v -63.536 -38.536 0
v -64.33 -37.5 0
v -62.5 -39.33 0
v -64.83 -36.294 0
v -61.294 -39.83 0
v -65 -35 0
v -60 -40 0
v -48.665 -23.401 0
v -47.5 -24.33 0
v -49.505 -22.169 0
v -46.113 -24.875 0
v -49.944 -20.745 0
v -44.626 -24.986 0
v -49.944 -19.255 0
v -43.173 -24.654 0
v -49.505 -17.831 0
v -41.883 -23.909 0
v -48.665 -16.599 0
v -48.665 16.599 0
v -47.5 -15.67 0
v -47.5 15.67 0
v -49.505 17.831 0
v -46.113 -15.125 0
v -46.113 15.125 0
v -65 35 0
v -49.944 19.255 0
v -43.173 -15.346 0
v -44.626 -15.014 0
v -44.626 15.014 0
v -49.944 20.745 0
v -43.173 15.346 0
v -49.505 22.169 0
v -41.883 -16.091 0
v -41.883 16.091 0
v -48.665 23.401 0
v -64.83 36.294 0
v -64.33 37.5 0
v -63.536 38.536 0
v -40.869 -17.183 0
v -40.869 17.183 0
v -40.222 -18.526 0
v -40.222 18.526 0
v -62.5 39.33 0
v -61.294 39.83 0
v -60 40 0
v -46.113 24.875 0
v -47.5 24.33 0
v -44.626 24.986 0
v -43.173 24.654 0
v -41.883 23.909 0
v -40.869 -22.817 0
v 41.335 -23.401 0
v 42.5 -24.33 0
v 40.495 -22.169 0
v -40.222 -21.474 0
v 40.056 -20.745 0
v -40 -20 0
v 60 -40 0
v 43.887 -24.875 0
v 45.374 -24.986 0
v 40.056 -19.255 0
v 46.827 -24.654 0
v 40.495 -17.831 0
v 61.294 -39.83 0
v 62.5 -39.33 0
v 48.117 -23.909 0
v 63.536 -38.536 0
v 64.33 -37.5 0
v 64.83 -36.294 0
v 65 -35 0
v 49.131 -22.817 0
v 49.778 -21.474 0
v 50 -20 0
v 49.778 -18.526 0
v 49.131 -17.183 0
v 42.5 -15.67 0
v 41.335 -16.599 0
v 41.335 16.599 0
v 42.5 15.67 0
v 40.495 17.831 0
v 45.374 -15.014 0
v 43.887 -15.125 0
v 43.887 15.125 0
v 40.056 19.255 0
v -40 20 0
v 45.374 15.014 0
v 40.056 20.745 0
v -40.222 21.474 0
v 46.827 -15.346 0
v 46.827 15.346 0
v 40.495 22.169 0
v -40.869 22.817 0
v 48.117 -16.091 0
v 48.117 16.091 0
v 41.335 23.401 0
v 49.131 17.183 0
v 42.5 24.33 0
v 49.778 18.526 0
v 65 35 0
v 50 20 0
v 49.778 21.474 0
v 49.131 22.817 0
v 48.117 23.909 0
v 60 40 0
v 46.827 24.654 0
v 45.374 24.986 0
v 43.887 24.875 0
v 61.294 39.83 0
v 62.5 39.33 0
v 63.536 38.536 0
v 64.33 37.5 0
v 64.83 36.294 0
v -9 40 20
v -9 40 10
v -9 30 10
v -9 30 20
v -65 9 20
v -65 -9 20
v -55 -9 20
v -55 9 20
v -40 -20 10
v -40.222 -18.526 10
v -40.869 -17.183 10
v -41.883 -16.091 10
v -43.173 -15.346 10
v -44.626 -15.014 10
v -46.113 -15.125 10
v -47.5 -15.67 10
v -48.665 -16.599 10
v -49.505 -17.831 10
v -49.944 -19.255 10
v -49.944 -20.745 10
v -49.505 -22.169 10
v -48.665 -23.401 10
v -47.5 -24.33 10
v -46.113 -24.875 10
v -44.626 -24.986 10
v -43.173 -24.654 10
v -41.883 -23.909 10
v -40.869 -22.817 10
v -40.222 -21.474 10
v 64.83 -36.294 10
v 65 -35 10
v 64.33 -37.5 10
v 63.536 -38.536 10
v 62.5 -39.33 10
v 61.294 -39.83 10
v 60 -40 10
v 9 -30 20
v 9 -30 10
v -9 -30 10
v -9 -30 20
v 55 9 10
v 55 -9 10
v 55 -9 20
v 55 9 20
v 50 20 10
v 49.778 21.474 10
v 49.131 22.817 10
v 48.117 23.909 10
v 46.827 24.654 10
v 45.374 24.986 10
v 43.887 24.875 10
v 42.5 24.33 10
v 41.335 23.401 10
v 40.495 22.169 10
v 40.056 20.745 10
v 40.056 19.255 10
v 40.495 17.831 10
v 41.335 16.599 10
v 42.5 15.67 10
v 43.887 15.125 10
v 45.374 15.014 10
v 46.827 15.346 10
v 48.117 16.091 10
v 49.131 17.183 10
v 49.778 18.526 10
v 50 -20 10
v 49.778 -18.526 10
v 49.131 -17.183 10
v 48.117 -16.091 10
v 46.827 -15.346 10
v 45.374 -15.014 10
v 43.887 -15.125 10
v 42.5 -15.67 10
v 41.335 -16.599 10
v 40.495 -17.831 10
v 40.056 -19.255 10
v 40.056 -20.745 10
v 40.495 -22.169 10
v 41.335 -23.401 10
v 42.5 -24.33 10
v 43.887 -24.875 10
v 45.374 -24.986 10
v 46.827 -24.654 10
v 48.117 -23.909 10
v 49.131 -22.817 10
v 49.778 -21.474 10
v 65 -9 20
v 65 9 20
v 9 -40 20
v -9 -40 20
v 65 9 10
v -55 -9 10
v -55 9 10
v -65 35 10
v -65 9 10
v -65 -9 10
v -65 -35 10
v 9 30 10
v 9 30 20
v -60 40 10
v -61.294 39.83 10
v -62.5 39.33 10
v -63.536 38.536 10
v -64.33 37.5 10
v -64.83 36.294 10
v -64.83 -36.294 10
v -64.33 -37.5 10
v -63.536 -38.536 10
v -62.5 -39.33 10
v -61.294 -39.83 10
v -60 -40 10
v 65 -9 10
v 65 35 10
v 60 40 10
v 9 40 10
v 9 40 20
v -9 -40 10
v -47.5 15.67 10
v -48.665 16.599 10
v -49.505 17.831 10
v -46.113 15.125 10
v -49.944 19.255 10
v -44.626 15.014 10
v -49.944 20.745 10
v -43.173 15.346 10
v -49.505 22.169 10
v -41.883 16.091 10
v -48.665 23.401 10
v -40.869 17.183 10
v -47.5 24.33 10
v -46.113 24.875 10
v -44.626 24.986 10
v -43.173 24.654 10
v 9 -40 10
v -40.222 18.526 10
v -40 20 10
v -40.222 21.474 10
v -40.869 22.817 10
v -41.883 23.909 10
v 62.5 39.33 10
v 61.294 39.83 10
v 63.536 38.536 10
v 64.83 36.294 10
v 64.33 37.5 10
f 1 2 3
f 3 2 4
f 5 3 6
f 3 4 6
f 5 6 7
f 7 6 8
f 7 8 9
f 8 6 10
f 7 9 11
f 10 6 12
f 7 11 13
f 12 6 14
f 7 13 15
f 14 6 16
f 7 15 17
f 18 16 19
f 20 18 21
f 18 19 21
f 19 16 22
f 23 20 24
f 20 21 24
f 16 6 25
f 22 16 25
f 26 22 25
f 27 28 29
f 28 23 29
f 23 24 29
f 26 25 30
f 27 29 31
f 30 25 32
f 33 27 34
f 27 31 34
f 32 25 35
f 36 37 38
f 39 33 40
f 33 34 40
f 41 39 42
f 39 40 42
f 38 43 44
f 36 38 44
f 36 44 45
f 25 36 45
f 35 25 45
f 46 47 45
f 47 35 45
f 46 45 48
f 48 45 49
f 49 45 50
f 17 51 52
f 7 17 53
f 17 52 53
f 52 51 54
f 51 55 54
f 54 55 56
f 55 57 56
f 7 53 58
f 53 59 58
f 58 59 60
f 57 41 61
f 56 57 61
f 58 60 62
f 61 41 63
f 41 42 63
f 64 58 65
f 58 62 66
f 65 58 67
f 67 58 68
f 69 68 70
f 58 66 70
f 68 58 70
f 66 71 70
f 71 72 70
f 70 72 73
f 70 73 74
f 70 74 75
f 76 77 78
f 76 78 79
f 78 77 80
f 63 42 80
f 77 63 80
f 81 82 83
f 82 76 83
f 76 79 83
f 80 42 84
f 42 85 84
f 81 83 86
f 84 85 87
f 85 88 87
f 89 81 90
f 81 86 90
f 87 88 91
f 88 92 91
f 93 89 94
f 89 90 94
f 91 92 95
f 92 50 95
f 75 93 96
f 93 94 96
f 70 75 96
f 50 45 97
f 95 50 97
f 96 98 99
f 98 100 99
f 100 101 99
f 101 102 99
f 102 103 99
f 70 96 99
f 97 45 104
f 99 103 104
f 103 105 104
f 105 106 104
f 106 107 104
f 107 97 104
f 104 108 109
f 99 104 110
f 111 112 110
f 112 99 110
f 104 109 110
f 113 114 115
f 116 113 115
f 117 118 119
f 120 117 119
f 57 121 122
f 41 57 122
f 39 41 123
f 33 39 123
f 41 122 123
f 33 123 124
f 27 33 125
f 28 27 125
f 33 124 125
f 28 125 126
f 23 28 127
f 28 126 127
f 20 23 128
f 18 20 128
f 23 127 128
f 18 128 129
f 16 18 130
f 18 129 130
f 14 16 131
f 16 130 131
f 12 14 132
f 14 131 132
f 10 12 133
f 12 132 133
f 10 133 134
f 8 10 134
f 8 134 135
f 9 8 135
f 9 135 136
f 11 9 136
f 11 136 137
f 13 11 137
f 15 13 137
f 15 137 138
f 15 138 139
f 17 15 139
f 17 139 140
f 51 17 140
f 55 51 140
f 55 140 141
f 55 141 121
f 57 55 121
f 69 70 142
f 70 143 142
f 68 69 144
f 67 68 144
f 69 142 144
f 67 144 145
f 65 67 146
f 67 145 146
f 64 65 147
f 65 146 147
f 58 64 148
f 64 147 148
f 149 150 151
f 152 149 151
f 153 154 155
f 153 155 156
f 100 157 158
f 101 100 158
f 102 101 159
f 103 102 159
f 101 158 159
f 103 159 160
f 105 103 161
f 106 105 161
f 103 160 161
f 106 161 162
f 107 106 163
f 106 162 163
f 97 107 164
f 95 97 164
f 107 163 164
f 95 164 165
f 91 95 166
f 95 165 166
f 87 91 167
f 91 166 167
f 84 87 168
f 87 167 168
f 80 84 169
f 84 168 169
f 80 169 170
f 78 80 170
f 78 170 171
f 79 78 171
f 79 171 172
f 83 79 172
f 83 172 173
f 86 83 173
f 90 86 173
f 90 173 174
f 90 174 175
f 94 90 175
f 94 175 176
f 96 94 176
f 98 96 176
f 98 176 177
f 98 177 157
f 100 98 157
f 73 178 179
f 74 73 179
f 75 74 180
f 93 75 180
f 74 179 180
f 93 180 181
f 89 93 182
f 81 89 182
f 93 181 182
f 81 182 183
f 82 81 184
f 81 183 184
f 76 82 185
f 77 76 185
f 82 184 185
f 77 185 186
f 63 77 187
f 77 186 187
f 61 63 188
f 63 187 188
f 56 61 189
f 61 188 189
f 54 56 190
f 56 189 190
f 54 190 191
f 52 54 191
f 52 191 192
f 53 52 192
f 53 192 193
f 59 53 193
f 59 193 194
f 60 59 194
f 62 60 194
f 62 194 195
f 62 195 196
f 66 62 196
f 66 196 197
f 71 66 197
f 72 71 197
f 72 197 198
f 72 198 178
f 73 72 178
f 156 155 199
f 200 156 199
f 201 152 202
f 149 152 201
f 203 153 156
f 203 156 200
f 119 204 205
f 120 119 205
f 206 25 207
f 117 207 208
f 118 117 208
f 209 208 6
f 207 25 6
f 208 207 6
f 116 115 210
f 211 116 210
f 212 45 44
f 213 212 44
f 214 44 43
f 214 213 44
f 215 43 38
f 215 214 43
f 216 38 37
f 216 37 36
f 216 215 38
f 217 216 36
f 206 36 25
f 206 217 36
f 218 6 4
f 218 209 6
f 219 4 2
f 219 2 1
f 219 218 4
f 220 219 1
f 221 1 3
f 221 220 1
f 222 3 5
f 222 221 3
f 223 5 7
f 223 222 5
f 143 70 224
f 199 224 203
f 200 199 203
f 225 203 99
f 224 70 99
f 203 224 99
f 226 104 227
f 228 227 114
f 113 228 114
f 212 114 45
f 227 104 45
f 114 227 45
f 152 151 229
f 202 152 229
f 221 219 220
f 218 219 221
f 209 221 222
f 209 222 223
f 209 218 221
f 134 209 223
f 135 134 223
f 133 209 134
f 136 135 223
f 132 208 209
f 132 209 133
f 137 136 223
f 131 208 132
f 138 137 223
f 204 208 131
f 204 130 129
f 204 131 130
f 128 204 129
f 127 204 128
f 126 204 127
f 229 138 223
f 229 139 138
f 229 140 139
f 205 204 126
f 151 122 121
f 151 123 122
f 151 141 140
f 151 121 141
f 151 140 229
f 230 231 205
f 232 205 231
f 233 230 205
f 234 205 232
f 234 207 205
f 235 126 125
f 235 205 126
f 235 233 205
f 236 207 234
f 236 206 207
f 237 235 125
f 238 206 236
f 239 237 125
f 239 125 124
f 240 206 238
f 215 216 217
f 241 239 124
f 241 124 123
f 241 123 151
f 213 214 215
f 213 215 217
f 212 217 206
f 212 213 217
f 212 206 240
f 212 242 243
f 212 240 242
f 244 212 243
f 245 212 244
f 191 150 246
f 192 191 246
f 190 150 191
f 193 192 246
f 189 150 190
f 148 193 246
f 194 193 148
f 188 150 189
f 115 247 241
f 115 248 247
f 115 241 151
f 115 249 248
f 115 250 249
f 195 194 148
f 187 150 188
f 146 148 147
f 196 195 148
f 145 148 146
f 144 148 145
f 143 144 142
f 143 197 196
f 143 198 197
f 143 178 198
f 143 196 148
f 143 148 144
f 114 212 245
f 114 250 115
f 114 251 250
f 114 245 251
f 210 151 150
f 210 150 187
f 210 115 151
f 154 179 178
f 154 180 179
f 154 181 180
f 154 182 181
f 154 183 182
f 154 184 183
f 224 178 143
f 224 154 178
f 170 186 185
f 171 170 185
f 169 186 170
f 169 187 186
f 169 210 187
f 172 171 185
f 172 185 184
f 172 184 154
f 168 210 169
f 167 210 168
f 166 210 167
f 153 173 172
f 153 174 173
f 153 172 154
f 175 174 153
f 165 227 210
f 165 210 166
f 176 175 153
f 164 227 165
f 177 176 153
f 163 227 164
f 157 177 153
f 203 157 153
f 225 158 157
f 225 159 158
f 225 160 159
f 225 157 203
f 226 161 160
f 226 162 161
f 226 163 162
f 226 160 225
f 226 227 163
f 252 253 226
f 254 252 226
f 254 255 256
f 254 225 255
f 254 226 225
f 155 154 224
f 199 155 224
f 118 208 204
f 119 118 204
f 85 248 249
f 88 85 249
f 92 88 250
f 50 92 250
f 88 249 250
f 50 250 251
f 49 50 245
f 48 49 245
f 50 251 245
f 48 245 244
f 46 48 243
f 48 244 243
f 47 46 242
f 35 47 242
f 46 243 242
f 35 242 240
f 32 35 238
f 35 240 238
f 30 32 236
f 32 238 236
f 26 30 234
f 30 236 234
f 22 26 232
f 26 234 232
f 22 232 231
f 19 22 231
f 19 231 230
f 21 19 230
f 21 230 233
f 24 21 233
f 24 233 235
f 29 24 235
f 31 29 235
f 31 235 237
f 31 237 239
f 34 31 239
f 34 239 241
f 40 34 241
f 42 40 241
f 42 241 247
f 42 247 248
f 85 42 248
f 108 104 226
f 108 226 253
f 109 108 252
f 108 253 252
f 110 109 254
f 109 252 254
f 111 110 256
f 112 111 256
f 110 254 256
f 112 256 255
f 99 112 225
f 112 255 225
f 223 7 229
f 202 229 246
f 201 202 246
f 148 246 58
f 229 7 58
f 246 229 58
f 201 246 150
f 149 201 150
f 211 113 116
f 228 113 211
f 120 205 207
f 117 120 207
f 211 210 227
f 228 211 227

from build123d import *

# Parameters (mm, degrees)
F1_DEPTH = 10
F2_W     = 10
F2_H     = 18
F3_DEPTH = 10
F4_R     = 5
F5_DEPTH = 10.001
F6_DEPTH = 10.001
F7_R     = 5


with BuildPart() as f1:
    # F0 (on Top) → F1 (new body)
    with BuildSketch(Plane.XY):
        Polygon((65, 40), (0, 40), (-65, 40), (-65, -40), (0, -40), (65, -40), align=None)
    extrude(amount=F1_DEPTH)

    # F2 (on face) → F3 (join)
    with BuildSketch(Plane.XY.offset(10)):
        Polygon((-9, 30), (0, 30), (9, 30), (9, 40), (-9, 40), align=None)
        with Locations((60, 0)):
            Rectangle(F2_W, F2_H)
        Polygon((-55, 9), (-65, 9), (-65, 0), (-65, -9), (-55, -9), align=None)
        Polygon((-9, -40), (9, -40), (9, -30), (0, -30), (-9, -30), align=None)
    extrude(amount=F3_DEPTH)

    # F4 (on face) → F5 (cut, through all)
    with BuildSketch(Plane.XY.offset(10)):
        with Locations((-45, -20)):
            Circle(F4_R)
        with Locations((45, -20)):
            Circle(F4_R)
        with Locations((45, 20)):
            Circle(F4_R)
        with Locations((-45, 20)):
            Circle(F4_R)
    extrude(amount=-F5_DEPTH, mode=Mode.SUBTRACT)

    # F4 (on face) → F6 (cut, through all)
    with BuildSketch(Plane.XY.offset(10)):
        with Locations((-45, -20)):
            Circle(F4_R)
        with Locations((45, -20)):
            Circle(F4_R)
        with Locations((45, 20)):
            Circle(F4_R)
        with Locations((-45, 20)):
            Circle(F4_R)
    extrude(amount=-F6_DEPTH, mode=Mode.SUBTRACT)

    # F7
    f7_edges = [f1.edges().sort_by_distance(p)[0] for p in [
        (-65, -40, 5),
        (65, -40, 5),
        (65, 40, 5),
        (-65, 40, 5),
    ]]
    fillet(f7_edges, radius=F7_R)


solid = f1.part
